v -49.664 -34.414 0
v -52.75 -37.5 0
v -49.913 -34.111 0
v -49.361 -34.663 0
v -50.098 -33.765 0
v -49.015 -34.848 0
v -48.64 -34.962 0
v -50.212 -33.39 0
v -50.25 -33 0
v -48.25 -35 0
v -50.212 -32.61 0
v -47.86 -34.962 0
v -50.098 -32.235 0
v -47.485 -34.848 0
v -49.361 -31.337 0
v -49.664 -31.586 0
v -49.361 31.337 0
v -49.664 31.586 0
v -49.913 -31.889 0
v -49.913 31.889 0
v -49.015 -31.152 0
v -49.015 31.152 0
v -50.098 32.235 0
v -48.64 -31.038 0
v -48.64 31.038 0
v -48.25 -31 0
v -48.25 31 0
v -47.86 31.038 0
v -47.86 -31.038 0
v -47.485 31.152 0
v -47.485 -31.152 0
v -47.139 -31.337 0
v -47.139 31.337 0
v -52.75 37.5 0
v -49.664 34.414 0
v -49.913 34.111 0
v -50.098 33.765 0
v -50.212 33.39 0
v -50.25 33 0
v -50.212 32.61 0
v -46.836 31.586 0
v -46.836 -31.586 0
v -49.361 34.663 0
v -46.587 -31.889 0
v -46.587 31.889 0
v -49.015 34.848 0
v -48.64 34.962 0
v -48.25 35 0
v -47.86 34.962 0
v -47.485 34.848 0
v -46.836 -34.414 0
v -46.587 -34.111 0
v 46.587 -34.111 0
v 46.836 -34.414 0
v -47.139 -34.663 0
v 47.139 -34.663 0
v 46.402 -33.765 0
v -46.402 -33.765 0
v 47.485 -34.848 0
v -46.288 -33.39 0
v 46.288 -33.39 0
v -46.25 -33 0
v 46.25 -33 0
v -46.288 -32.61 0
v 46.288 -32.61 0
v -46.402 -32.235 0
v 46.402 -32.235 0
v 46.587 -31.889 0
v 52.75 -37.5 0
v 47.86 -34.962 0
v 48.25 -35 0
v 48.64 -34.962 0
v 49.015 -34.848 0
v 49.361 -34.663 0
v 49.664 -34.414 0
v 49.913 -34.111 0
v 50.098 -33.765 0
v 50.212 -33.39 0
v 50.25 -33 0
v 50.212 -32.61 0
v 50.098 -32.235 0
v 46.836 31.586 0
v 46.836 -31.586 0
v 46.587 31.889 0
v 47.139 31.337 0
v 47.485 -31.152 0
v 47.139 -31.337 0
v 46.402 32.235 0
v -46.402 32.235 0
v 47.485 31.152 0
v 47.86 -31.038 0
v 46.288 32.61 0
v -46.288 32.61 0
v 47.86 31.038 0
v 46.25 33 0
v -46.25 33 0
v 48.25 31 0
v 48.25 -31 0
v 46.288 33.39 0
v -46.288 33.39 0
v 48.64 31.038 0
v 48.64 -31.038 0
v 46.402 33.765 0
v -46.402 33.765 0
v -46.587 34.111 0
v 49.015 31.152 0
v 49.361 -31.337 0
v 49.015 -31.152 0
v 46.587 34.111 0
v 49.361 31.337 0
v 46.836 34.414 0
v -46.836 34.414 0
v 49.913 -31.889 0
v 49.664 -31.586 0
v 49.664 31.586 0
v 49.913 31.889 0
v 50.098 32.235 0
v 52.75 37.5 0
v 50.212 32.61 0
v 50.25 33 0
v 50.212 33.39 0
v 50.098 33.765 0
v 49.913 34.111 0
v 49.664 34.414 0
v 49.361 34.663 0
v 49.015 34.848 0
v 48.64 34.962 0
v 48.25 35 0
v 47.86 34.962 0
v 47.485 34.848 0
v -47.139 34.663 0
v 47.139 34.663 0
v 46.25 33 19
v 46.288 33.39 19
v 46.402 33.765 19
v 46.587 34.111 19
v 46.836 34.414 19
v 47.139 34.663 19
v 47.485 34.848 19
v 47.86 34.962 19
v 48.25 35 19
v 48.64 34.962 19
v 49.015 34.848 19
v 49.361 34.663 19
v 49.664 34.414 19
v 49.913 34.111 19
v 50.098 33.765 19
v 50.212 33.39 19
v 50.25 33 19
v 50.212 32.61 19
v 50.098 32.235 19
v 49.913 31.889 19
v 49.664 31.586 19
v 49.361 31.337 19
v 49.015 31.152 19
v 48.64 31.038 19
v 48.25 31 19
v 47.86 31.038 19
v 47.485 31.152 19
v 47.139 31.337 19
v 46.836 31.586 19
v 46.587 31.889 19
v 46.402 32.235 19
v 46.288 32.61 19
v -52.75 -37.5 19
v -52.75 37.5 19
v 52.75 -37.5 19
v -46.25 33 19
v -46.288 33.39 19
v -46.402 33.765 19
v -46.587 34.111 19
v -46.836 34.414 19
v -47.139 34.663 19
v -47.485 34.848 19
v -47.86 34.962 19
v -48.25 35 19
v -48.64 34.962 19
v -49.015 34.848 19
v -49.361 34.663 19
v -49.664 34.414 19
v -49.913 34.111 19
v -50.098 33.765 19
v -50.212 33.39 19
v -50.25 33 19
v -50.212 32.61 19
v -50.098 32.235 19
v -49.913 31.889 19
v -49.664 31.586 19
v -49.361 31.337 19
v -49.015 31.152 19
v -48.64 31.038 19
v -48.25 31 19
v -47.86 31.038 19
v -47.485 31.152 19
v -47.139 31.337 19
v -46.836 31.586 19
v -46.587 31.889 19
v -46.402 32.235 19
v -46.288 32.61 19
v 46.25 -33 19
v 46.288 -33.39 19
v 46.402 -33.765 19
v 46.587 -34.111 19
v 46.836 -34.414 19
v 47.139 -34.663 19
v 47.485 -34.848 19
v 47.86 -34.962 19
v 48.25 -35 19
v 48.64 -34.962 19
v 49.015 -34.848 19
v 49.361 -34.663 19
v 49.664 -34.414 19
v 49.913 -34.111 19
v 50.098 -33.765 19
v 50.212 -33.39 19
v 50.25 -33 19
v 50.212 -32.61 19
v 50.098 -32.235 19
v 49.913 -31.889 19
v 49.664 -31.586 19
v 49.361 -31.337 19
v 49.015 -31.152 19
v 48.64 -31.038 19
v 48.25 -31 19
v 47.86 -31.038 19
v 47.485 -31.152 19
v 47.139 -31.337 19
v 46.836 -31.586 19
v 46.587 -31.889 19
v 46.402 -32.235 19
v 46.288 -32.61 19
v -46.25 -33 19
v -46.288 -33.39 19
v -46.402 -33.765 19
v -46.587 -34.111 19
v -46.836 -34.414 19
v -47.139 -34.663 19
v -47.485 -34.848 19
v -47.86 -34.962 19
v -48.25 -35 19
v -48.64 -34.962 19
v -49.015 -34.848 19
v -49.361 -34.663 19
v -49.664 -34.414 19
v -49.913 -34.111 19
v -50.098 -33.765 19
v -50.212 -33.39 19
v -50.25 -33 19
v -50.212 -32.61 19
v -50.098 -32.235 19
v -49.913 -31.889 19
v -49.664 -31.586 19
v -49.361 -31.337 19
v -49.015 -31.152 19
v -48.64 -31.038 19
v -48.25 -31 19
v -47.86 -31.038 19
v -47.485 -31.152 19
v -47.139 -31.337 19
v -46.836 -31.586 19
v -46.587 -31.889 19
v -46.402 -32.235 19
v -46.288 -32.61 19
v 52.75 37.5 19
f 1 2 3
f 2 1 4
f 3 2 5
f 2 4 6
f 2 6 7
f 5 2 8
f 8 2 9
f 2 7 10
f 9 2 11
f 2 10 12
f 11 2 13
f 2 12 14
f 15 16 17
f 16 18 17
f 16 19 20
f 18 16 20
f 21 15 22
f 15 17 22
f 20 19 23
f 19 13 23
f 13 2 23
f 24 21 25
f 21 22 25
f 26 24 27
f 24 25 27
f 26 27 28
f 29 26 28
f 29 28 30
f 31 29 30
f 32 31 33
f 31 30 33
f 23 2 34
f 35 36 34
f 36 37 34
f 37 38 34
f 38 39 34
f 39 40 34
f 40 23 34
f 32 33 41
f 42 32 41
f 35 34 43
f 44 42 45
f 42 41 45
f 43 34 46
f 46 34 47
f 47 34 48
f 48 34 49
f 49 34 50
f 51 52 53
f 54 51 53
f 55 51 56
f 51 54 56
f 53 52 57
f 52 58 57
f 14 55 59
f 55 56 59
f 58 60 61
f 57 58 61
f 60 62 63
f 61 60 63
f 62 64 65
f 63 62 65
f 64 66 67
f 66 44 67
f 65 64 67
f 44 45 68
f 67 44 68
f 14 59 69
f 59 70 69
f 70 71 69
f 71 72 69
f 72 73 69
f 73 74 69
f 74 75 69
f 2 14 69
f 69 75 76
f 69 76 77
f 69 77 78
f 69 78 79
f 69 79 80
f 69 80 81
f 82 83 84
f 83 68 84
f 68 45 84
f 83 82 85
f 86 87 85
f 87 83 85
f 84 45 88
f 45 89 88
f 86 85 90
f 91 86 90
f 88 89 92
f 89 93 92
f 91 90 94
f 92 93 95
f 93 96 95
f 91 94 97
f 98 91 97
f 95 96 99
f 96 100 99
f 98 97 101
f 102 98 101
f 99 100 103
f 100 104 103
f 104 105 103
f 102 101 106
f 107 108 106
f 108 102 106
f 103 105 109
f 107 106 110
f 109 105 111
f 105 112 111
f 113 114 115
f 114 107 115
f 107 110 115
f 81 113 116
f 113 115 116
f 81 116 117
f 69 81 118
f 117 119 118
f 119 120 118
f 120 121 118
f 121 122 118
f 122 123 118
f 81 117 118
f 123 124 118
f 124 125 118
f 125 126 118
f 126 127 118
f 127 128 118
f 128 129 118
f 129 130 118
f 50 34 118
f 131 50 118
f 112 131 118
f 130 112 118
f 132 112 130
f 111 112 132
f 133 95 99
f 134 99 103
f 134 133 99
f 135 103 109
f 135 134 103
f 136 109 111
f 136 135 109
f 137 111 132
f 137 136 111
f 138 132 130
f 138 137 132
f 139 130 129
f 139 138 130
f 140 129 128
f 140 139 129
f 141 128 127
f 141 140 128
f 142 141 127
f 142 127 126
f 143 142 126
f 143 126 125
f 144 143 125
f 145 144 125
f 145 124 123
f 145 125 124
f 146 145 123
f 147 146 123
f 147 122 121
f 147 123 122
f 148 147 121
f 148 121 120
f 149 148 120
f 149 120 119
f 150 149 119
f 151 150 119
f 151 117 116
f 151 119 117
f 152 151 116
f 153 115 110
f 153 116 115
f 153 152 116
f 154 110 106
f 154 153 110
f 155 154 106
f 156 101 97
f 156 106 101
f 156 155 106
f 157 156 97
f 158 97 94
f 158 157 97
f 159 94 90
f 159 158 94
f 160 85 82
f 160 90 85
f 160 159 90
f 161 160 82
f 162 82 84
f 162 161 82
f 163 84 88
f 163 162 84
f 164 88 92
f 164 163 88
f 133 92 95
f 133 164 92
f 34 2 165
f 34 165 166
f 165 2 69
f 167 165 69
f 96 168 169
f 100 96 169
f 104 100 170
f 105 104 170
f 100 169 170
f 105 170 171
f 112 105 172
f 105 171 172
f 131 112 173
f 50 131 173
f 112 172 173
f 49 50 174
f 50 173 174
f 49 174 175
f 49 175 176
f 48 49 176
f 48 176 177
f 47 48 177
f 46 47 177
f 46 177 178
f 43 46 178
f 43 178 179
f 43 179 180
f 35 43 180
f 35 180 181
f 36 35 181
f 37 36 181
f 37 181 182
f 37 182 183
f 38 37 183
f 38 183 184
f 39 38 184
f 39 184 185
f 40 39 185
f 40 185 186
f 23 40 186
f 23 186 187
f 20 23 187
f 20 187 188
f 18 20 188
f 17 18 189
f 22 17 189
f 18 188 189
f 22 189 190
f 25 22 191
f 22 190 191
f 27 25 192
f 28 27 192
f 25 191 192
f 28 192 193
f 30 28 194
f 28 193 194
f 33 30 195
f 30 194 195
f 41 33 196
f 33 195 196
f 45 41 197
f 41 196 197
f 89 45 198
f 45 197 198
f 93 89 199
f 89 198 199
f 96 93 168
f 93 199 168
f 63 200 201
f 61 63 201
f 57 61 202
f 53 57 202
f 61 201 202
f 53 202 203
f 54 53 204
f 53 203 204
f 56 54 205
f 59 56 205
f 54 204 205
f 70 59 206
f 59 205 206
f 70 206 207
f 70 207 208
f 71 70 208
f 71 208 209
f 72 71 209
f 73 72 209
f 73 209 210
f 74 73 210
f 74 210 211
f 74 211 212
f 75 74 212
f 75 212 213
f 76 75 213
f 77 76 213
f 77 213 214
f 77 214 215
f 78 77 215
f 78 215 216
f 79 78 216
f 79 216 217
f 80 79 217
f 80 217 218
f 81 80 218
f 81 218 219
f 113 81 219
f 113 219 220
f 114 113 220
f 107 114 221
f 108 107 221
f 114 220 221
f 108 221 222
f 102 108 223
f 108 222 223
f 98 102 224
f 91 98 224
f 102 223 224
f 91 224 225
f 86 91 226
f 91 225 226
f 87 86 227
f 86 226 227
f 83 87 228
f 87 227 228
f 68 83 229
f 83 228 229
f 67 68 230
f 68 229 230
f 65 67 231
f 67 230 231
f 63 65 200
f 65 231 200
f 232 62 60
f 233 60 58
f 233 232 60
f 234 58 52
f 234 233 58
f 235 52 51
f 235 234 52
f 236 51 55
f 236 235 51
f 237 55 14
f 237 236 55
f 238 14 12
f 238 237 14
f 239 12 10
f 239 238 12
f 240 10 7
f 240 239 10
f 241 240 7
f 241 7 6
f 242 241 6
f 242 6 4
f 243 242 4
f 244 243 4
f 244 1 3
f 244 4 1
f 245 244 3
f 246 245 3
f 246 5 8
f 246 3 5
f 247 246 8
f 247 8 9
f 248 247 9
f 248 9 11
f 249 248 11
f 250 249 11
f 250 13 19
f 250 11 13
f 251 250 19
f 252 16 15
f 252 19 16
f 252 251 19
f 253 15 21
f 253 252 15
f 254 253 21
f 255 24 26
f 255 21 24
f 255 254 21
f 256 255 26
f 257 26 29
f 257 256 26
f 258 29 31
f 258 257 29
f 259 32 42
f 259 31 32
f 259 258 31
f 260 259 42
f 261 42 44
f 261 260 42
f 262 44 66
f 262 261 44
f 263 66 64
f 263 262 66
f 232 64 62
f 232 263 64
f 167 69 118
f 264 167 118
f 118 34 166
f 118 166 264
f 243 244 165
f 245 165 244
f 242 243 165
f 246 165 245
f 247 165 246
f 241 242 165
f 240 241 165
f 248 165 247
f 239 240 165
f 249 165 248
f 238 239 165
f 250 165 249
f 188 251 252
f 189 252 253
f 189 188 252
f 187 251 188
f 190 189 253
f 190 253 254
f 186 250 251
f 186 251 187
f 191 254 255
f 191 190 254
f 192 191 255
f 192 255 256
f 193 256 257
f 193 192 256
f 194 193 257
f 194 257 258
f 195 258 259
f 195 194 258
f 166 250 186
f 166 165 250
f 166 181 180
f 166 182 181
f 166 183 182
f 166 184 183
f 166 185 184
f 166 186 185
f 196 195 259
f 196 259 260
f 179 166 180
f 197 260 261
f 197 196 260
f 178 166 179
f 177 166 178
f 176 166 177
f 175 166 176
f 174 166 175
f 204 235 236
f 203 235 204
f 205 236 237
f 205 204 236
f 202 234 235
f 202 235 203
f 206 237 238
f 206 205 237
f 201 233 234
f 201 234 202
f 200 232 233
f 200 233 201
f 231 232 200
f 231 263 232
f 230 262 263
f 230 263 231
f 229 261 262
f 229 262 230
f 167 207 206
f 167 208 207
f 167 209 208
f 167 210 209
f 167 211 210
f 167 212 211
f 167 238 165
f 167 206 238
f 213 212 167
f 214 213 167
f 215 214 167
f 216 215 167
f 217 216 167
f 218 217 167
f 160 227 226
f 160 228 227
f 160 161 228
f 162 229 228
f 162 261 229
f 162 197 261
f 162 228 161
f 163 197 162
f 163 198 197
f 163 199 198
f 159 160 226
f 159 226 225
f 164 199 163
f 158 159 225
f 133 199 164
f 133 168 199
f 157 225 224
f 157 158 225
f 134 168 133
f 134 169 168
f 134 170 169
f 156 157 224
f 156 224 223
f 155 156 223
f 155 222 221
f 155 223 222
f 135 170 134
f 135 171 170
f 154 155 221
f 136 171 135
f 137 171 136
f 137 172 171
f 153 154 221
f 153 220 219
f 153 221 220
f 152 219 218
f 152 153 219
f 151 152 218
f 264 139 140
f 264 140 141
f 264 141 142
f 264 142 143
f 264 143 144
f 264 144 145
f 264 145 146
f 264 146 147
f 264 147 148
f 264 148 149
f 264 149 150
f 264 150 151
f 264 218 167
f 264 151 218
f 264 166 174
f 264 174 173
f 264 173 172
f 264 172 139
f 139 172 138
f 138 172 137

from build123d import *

# Parameters (mm, degrees)
ESQUISSE1_W               = 105.5
ESQUISSE1_H               = 75
BOSS_EXTRU_1_DEPTH        = 19
ESQUISSE2_R               = 2
ENL_V_MAT_EXTRU_1_DEPTH   = 68.452297959
SYM_TRIE2_COPY_1_SKETCH_R = 2
SYM_TRIE2_COPY_1_DEPTH    = 68.452297959


with BuildPart() as part:
    # Esquisse1 → Boss.-Extru.1 (new body)
    with BuildSketch(Plane.XY):
        Rectangle(ESQUISSE1_W, ESQUISSE1_H)
    extrude(amount=BOSS_EXTRU_1_DEPTH)

    # Esquisse2 → Enlèv. mat.-Extru.1 (cut, through all)
    with BuildSketch(Plane.XY.offset(19)):
        with Locations((-48.25, 33)):
            Circle(ESQUISSE2_R)
    enl_v_mat_extru_1 = extrude(amount=-ENL_V_MAT_EXTRU_1_DEPTH, mode=Mode.SUBTRACT)

    # Symétrie1: Enlèv. mat.-Extru.1 across plane
    add(enl_v_mat_extru_1.mirror(Plane.ZX), mode=Mode.SUBTRACT)

    # Symétrie2: Enlèv. mat.-Extru.1 across plane
    add(enl_v_mat_extru_1.mirror(Plane(origin=(0, 0, 0), x_dir=(0, 0, 1), z_dir=(1, 0, 0))), mode=Mode.SUBTRACT)

    # Symétrie2 copy 1 sketch → Symétrie2 copy 1 (cut, through all)
    with BuildSketch(Plane(origin=(0, 0, 19), x_dir=(-1, 0, 0), z_dir=(0, 0, 1))):
        with Locations((-48.25, 33)):
            Circle(SYM_TRIE2_COPY_1_SKETCH_R)
    extrude(amount=-SYM_TRIE2_COPY_1_DEPTH, mode=Mode.SUBTRACT)


solid = part.part
